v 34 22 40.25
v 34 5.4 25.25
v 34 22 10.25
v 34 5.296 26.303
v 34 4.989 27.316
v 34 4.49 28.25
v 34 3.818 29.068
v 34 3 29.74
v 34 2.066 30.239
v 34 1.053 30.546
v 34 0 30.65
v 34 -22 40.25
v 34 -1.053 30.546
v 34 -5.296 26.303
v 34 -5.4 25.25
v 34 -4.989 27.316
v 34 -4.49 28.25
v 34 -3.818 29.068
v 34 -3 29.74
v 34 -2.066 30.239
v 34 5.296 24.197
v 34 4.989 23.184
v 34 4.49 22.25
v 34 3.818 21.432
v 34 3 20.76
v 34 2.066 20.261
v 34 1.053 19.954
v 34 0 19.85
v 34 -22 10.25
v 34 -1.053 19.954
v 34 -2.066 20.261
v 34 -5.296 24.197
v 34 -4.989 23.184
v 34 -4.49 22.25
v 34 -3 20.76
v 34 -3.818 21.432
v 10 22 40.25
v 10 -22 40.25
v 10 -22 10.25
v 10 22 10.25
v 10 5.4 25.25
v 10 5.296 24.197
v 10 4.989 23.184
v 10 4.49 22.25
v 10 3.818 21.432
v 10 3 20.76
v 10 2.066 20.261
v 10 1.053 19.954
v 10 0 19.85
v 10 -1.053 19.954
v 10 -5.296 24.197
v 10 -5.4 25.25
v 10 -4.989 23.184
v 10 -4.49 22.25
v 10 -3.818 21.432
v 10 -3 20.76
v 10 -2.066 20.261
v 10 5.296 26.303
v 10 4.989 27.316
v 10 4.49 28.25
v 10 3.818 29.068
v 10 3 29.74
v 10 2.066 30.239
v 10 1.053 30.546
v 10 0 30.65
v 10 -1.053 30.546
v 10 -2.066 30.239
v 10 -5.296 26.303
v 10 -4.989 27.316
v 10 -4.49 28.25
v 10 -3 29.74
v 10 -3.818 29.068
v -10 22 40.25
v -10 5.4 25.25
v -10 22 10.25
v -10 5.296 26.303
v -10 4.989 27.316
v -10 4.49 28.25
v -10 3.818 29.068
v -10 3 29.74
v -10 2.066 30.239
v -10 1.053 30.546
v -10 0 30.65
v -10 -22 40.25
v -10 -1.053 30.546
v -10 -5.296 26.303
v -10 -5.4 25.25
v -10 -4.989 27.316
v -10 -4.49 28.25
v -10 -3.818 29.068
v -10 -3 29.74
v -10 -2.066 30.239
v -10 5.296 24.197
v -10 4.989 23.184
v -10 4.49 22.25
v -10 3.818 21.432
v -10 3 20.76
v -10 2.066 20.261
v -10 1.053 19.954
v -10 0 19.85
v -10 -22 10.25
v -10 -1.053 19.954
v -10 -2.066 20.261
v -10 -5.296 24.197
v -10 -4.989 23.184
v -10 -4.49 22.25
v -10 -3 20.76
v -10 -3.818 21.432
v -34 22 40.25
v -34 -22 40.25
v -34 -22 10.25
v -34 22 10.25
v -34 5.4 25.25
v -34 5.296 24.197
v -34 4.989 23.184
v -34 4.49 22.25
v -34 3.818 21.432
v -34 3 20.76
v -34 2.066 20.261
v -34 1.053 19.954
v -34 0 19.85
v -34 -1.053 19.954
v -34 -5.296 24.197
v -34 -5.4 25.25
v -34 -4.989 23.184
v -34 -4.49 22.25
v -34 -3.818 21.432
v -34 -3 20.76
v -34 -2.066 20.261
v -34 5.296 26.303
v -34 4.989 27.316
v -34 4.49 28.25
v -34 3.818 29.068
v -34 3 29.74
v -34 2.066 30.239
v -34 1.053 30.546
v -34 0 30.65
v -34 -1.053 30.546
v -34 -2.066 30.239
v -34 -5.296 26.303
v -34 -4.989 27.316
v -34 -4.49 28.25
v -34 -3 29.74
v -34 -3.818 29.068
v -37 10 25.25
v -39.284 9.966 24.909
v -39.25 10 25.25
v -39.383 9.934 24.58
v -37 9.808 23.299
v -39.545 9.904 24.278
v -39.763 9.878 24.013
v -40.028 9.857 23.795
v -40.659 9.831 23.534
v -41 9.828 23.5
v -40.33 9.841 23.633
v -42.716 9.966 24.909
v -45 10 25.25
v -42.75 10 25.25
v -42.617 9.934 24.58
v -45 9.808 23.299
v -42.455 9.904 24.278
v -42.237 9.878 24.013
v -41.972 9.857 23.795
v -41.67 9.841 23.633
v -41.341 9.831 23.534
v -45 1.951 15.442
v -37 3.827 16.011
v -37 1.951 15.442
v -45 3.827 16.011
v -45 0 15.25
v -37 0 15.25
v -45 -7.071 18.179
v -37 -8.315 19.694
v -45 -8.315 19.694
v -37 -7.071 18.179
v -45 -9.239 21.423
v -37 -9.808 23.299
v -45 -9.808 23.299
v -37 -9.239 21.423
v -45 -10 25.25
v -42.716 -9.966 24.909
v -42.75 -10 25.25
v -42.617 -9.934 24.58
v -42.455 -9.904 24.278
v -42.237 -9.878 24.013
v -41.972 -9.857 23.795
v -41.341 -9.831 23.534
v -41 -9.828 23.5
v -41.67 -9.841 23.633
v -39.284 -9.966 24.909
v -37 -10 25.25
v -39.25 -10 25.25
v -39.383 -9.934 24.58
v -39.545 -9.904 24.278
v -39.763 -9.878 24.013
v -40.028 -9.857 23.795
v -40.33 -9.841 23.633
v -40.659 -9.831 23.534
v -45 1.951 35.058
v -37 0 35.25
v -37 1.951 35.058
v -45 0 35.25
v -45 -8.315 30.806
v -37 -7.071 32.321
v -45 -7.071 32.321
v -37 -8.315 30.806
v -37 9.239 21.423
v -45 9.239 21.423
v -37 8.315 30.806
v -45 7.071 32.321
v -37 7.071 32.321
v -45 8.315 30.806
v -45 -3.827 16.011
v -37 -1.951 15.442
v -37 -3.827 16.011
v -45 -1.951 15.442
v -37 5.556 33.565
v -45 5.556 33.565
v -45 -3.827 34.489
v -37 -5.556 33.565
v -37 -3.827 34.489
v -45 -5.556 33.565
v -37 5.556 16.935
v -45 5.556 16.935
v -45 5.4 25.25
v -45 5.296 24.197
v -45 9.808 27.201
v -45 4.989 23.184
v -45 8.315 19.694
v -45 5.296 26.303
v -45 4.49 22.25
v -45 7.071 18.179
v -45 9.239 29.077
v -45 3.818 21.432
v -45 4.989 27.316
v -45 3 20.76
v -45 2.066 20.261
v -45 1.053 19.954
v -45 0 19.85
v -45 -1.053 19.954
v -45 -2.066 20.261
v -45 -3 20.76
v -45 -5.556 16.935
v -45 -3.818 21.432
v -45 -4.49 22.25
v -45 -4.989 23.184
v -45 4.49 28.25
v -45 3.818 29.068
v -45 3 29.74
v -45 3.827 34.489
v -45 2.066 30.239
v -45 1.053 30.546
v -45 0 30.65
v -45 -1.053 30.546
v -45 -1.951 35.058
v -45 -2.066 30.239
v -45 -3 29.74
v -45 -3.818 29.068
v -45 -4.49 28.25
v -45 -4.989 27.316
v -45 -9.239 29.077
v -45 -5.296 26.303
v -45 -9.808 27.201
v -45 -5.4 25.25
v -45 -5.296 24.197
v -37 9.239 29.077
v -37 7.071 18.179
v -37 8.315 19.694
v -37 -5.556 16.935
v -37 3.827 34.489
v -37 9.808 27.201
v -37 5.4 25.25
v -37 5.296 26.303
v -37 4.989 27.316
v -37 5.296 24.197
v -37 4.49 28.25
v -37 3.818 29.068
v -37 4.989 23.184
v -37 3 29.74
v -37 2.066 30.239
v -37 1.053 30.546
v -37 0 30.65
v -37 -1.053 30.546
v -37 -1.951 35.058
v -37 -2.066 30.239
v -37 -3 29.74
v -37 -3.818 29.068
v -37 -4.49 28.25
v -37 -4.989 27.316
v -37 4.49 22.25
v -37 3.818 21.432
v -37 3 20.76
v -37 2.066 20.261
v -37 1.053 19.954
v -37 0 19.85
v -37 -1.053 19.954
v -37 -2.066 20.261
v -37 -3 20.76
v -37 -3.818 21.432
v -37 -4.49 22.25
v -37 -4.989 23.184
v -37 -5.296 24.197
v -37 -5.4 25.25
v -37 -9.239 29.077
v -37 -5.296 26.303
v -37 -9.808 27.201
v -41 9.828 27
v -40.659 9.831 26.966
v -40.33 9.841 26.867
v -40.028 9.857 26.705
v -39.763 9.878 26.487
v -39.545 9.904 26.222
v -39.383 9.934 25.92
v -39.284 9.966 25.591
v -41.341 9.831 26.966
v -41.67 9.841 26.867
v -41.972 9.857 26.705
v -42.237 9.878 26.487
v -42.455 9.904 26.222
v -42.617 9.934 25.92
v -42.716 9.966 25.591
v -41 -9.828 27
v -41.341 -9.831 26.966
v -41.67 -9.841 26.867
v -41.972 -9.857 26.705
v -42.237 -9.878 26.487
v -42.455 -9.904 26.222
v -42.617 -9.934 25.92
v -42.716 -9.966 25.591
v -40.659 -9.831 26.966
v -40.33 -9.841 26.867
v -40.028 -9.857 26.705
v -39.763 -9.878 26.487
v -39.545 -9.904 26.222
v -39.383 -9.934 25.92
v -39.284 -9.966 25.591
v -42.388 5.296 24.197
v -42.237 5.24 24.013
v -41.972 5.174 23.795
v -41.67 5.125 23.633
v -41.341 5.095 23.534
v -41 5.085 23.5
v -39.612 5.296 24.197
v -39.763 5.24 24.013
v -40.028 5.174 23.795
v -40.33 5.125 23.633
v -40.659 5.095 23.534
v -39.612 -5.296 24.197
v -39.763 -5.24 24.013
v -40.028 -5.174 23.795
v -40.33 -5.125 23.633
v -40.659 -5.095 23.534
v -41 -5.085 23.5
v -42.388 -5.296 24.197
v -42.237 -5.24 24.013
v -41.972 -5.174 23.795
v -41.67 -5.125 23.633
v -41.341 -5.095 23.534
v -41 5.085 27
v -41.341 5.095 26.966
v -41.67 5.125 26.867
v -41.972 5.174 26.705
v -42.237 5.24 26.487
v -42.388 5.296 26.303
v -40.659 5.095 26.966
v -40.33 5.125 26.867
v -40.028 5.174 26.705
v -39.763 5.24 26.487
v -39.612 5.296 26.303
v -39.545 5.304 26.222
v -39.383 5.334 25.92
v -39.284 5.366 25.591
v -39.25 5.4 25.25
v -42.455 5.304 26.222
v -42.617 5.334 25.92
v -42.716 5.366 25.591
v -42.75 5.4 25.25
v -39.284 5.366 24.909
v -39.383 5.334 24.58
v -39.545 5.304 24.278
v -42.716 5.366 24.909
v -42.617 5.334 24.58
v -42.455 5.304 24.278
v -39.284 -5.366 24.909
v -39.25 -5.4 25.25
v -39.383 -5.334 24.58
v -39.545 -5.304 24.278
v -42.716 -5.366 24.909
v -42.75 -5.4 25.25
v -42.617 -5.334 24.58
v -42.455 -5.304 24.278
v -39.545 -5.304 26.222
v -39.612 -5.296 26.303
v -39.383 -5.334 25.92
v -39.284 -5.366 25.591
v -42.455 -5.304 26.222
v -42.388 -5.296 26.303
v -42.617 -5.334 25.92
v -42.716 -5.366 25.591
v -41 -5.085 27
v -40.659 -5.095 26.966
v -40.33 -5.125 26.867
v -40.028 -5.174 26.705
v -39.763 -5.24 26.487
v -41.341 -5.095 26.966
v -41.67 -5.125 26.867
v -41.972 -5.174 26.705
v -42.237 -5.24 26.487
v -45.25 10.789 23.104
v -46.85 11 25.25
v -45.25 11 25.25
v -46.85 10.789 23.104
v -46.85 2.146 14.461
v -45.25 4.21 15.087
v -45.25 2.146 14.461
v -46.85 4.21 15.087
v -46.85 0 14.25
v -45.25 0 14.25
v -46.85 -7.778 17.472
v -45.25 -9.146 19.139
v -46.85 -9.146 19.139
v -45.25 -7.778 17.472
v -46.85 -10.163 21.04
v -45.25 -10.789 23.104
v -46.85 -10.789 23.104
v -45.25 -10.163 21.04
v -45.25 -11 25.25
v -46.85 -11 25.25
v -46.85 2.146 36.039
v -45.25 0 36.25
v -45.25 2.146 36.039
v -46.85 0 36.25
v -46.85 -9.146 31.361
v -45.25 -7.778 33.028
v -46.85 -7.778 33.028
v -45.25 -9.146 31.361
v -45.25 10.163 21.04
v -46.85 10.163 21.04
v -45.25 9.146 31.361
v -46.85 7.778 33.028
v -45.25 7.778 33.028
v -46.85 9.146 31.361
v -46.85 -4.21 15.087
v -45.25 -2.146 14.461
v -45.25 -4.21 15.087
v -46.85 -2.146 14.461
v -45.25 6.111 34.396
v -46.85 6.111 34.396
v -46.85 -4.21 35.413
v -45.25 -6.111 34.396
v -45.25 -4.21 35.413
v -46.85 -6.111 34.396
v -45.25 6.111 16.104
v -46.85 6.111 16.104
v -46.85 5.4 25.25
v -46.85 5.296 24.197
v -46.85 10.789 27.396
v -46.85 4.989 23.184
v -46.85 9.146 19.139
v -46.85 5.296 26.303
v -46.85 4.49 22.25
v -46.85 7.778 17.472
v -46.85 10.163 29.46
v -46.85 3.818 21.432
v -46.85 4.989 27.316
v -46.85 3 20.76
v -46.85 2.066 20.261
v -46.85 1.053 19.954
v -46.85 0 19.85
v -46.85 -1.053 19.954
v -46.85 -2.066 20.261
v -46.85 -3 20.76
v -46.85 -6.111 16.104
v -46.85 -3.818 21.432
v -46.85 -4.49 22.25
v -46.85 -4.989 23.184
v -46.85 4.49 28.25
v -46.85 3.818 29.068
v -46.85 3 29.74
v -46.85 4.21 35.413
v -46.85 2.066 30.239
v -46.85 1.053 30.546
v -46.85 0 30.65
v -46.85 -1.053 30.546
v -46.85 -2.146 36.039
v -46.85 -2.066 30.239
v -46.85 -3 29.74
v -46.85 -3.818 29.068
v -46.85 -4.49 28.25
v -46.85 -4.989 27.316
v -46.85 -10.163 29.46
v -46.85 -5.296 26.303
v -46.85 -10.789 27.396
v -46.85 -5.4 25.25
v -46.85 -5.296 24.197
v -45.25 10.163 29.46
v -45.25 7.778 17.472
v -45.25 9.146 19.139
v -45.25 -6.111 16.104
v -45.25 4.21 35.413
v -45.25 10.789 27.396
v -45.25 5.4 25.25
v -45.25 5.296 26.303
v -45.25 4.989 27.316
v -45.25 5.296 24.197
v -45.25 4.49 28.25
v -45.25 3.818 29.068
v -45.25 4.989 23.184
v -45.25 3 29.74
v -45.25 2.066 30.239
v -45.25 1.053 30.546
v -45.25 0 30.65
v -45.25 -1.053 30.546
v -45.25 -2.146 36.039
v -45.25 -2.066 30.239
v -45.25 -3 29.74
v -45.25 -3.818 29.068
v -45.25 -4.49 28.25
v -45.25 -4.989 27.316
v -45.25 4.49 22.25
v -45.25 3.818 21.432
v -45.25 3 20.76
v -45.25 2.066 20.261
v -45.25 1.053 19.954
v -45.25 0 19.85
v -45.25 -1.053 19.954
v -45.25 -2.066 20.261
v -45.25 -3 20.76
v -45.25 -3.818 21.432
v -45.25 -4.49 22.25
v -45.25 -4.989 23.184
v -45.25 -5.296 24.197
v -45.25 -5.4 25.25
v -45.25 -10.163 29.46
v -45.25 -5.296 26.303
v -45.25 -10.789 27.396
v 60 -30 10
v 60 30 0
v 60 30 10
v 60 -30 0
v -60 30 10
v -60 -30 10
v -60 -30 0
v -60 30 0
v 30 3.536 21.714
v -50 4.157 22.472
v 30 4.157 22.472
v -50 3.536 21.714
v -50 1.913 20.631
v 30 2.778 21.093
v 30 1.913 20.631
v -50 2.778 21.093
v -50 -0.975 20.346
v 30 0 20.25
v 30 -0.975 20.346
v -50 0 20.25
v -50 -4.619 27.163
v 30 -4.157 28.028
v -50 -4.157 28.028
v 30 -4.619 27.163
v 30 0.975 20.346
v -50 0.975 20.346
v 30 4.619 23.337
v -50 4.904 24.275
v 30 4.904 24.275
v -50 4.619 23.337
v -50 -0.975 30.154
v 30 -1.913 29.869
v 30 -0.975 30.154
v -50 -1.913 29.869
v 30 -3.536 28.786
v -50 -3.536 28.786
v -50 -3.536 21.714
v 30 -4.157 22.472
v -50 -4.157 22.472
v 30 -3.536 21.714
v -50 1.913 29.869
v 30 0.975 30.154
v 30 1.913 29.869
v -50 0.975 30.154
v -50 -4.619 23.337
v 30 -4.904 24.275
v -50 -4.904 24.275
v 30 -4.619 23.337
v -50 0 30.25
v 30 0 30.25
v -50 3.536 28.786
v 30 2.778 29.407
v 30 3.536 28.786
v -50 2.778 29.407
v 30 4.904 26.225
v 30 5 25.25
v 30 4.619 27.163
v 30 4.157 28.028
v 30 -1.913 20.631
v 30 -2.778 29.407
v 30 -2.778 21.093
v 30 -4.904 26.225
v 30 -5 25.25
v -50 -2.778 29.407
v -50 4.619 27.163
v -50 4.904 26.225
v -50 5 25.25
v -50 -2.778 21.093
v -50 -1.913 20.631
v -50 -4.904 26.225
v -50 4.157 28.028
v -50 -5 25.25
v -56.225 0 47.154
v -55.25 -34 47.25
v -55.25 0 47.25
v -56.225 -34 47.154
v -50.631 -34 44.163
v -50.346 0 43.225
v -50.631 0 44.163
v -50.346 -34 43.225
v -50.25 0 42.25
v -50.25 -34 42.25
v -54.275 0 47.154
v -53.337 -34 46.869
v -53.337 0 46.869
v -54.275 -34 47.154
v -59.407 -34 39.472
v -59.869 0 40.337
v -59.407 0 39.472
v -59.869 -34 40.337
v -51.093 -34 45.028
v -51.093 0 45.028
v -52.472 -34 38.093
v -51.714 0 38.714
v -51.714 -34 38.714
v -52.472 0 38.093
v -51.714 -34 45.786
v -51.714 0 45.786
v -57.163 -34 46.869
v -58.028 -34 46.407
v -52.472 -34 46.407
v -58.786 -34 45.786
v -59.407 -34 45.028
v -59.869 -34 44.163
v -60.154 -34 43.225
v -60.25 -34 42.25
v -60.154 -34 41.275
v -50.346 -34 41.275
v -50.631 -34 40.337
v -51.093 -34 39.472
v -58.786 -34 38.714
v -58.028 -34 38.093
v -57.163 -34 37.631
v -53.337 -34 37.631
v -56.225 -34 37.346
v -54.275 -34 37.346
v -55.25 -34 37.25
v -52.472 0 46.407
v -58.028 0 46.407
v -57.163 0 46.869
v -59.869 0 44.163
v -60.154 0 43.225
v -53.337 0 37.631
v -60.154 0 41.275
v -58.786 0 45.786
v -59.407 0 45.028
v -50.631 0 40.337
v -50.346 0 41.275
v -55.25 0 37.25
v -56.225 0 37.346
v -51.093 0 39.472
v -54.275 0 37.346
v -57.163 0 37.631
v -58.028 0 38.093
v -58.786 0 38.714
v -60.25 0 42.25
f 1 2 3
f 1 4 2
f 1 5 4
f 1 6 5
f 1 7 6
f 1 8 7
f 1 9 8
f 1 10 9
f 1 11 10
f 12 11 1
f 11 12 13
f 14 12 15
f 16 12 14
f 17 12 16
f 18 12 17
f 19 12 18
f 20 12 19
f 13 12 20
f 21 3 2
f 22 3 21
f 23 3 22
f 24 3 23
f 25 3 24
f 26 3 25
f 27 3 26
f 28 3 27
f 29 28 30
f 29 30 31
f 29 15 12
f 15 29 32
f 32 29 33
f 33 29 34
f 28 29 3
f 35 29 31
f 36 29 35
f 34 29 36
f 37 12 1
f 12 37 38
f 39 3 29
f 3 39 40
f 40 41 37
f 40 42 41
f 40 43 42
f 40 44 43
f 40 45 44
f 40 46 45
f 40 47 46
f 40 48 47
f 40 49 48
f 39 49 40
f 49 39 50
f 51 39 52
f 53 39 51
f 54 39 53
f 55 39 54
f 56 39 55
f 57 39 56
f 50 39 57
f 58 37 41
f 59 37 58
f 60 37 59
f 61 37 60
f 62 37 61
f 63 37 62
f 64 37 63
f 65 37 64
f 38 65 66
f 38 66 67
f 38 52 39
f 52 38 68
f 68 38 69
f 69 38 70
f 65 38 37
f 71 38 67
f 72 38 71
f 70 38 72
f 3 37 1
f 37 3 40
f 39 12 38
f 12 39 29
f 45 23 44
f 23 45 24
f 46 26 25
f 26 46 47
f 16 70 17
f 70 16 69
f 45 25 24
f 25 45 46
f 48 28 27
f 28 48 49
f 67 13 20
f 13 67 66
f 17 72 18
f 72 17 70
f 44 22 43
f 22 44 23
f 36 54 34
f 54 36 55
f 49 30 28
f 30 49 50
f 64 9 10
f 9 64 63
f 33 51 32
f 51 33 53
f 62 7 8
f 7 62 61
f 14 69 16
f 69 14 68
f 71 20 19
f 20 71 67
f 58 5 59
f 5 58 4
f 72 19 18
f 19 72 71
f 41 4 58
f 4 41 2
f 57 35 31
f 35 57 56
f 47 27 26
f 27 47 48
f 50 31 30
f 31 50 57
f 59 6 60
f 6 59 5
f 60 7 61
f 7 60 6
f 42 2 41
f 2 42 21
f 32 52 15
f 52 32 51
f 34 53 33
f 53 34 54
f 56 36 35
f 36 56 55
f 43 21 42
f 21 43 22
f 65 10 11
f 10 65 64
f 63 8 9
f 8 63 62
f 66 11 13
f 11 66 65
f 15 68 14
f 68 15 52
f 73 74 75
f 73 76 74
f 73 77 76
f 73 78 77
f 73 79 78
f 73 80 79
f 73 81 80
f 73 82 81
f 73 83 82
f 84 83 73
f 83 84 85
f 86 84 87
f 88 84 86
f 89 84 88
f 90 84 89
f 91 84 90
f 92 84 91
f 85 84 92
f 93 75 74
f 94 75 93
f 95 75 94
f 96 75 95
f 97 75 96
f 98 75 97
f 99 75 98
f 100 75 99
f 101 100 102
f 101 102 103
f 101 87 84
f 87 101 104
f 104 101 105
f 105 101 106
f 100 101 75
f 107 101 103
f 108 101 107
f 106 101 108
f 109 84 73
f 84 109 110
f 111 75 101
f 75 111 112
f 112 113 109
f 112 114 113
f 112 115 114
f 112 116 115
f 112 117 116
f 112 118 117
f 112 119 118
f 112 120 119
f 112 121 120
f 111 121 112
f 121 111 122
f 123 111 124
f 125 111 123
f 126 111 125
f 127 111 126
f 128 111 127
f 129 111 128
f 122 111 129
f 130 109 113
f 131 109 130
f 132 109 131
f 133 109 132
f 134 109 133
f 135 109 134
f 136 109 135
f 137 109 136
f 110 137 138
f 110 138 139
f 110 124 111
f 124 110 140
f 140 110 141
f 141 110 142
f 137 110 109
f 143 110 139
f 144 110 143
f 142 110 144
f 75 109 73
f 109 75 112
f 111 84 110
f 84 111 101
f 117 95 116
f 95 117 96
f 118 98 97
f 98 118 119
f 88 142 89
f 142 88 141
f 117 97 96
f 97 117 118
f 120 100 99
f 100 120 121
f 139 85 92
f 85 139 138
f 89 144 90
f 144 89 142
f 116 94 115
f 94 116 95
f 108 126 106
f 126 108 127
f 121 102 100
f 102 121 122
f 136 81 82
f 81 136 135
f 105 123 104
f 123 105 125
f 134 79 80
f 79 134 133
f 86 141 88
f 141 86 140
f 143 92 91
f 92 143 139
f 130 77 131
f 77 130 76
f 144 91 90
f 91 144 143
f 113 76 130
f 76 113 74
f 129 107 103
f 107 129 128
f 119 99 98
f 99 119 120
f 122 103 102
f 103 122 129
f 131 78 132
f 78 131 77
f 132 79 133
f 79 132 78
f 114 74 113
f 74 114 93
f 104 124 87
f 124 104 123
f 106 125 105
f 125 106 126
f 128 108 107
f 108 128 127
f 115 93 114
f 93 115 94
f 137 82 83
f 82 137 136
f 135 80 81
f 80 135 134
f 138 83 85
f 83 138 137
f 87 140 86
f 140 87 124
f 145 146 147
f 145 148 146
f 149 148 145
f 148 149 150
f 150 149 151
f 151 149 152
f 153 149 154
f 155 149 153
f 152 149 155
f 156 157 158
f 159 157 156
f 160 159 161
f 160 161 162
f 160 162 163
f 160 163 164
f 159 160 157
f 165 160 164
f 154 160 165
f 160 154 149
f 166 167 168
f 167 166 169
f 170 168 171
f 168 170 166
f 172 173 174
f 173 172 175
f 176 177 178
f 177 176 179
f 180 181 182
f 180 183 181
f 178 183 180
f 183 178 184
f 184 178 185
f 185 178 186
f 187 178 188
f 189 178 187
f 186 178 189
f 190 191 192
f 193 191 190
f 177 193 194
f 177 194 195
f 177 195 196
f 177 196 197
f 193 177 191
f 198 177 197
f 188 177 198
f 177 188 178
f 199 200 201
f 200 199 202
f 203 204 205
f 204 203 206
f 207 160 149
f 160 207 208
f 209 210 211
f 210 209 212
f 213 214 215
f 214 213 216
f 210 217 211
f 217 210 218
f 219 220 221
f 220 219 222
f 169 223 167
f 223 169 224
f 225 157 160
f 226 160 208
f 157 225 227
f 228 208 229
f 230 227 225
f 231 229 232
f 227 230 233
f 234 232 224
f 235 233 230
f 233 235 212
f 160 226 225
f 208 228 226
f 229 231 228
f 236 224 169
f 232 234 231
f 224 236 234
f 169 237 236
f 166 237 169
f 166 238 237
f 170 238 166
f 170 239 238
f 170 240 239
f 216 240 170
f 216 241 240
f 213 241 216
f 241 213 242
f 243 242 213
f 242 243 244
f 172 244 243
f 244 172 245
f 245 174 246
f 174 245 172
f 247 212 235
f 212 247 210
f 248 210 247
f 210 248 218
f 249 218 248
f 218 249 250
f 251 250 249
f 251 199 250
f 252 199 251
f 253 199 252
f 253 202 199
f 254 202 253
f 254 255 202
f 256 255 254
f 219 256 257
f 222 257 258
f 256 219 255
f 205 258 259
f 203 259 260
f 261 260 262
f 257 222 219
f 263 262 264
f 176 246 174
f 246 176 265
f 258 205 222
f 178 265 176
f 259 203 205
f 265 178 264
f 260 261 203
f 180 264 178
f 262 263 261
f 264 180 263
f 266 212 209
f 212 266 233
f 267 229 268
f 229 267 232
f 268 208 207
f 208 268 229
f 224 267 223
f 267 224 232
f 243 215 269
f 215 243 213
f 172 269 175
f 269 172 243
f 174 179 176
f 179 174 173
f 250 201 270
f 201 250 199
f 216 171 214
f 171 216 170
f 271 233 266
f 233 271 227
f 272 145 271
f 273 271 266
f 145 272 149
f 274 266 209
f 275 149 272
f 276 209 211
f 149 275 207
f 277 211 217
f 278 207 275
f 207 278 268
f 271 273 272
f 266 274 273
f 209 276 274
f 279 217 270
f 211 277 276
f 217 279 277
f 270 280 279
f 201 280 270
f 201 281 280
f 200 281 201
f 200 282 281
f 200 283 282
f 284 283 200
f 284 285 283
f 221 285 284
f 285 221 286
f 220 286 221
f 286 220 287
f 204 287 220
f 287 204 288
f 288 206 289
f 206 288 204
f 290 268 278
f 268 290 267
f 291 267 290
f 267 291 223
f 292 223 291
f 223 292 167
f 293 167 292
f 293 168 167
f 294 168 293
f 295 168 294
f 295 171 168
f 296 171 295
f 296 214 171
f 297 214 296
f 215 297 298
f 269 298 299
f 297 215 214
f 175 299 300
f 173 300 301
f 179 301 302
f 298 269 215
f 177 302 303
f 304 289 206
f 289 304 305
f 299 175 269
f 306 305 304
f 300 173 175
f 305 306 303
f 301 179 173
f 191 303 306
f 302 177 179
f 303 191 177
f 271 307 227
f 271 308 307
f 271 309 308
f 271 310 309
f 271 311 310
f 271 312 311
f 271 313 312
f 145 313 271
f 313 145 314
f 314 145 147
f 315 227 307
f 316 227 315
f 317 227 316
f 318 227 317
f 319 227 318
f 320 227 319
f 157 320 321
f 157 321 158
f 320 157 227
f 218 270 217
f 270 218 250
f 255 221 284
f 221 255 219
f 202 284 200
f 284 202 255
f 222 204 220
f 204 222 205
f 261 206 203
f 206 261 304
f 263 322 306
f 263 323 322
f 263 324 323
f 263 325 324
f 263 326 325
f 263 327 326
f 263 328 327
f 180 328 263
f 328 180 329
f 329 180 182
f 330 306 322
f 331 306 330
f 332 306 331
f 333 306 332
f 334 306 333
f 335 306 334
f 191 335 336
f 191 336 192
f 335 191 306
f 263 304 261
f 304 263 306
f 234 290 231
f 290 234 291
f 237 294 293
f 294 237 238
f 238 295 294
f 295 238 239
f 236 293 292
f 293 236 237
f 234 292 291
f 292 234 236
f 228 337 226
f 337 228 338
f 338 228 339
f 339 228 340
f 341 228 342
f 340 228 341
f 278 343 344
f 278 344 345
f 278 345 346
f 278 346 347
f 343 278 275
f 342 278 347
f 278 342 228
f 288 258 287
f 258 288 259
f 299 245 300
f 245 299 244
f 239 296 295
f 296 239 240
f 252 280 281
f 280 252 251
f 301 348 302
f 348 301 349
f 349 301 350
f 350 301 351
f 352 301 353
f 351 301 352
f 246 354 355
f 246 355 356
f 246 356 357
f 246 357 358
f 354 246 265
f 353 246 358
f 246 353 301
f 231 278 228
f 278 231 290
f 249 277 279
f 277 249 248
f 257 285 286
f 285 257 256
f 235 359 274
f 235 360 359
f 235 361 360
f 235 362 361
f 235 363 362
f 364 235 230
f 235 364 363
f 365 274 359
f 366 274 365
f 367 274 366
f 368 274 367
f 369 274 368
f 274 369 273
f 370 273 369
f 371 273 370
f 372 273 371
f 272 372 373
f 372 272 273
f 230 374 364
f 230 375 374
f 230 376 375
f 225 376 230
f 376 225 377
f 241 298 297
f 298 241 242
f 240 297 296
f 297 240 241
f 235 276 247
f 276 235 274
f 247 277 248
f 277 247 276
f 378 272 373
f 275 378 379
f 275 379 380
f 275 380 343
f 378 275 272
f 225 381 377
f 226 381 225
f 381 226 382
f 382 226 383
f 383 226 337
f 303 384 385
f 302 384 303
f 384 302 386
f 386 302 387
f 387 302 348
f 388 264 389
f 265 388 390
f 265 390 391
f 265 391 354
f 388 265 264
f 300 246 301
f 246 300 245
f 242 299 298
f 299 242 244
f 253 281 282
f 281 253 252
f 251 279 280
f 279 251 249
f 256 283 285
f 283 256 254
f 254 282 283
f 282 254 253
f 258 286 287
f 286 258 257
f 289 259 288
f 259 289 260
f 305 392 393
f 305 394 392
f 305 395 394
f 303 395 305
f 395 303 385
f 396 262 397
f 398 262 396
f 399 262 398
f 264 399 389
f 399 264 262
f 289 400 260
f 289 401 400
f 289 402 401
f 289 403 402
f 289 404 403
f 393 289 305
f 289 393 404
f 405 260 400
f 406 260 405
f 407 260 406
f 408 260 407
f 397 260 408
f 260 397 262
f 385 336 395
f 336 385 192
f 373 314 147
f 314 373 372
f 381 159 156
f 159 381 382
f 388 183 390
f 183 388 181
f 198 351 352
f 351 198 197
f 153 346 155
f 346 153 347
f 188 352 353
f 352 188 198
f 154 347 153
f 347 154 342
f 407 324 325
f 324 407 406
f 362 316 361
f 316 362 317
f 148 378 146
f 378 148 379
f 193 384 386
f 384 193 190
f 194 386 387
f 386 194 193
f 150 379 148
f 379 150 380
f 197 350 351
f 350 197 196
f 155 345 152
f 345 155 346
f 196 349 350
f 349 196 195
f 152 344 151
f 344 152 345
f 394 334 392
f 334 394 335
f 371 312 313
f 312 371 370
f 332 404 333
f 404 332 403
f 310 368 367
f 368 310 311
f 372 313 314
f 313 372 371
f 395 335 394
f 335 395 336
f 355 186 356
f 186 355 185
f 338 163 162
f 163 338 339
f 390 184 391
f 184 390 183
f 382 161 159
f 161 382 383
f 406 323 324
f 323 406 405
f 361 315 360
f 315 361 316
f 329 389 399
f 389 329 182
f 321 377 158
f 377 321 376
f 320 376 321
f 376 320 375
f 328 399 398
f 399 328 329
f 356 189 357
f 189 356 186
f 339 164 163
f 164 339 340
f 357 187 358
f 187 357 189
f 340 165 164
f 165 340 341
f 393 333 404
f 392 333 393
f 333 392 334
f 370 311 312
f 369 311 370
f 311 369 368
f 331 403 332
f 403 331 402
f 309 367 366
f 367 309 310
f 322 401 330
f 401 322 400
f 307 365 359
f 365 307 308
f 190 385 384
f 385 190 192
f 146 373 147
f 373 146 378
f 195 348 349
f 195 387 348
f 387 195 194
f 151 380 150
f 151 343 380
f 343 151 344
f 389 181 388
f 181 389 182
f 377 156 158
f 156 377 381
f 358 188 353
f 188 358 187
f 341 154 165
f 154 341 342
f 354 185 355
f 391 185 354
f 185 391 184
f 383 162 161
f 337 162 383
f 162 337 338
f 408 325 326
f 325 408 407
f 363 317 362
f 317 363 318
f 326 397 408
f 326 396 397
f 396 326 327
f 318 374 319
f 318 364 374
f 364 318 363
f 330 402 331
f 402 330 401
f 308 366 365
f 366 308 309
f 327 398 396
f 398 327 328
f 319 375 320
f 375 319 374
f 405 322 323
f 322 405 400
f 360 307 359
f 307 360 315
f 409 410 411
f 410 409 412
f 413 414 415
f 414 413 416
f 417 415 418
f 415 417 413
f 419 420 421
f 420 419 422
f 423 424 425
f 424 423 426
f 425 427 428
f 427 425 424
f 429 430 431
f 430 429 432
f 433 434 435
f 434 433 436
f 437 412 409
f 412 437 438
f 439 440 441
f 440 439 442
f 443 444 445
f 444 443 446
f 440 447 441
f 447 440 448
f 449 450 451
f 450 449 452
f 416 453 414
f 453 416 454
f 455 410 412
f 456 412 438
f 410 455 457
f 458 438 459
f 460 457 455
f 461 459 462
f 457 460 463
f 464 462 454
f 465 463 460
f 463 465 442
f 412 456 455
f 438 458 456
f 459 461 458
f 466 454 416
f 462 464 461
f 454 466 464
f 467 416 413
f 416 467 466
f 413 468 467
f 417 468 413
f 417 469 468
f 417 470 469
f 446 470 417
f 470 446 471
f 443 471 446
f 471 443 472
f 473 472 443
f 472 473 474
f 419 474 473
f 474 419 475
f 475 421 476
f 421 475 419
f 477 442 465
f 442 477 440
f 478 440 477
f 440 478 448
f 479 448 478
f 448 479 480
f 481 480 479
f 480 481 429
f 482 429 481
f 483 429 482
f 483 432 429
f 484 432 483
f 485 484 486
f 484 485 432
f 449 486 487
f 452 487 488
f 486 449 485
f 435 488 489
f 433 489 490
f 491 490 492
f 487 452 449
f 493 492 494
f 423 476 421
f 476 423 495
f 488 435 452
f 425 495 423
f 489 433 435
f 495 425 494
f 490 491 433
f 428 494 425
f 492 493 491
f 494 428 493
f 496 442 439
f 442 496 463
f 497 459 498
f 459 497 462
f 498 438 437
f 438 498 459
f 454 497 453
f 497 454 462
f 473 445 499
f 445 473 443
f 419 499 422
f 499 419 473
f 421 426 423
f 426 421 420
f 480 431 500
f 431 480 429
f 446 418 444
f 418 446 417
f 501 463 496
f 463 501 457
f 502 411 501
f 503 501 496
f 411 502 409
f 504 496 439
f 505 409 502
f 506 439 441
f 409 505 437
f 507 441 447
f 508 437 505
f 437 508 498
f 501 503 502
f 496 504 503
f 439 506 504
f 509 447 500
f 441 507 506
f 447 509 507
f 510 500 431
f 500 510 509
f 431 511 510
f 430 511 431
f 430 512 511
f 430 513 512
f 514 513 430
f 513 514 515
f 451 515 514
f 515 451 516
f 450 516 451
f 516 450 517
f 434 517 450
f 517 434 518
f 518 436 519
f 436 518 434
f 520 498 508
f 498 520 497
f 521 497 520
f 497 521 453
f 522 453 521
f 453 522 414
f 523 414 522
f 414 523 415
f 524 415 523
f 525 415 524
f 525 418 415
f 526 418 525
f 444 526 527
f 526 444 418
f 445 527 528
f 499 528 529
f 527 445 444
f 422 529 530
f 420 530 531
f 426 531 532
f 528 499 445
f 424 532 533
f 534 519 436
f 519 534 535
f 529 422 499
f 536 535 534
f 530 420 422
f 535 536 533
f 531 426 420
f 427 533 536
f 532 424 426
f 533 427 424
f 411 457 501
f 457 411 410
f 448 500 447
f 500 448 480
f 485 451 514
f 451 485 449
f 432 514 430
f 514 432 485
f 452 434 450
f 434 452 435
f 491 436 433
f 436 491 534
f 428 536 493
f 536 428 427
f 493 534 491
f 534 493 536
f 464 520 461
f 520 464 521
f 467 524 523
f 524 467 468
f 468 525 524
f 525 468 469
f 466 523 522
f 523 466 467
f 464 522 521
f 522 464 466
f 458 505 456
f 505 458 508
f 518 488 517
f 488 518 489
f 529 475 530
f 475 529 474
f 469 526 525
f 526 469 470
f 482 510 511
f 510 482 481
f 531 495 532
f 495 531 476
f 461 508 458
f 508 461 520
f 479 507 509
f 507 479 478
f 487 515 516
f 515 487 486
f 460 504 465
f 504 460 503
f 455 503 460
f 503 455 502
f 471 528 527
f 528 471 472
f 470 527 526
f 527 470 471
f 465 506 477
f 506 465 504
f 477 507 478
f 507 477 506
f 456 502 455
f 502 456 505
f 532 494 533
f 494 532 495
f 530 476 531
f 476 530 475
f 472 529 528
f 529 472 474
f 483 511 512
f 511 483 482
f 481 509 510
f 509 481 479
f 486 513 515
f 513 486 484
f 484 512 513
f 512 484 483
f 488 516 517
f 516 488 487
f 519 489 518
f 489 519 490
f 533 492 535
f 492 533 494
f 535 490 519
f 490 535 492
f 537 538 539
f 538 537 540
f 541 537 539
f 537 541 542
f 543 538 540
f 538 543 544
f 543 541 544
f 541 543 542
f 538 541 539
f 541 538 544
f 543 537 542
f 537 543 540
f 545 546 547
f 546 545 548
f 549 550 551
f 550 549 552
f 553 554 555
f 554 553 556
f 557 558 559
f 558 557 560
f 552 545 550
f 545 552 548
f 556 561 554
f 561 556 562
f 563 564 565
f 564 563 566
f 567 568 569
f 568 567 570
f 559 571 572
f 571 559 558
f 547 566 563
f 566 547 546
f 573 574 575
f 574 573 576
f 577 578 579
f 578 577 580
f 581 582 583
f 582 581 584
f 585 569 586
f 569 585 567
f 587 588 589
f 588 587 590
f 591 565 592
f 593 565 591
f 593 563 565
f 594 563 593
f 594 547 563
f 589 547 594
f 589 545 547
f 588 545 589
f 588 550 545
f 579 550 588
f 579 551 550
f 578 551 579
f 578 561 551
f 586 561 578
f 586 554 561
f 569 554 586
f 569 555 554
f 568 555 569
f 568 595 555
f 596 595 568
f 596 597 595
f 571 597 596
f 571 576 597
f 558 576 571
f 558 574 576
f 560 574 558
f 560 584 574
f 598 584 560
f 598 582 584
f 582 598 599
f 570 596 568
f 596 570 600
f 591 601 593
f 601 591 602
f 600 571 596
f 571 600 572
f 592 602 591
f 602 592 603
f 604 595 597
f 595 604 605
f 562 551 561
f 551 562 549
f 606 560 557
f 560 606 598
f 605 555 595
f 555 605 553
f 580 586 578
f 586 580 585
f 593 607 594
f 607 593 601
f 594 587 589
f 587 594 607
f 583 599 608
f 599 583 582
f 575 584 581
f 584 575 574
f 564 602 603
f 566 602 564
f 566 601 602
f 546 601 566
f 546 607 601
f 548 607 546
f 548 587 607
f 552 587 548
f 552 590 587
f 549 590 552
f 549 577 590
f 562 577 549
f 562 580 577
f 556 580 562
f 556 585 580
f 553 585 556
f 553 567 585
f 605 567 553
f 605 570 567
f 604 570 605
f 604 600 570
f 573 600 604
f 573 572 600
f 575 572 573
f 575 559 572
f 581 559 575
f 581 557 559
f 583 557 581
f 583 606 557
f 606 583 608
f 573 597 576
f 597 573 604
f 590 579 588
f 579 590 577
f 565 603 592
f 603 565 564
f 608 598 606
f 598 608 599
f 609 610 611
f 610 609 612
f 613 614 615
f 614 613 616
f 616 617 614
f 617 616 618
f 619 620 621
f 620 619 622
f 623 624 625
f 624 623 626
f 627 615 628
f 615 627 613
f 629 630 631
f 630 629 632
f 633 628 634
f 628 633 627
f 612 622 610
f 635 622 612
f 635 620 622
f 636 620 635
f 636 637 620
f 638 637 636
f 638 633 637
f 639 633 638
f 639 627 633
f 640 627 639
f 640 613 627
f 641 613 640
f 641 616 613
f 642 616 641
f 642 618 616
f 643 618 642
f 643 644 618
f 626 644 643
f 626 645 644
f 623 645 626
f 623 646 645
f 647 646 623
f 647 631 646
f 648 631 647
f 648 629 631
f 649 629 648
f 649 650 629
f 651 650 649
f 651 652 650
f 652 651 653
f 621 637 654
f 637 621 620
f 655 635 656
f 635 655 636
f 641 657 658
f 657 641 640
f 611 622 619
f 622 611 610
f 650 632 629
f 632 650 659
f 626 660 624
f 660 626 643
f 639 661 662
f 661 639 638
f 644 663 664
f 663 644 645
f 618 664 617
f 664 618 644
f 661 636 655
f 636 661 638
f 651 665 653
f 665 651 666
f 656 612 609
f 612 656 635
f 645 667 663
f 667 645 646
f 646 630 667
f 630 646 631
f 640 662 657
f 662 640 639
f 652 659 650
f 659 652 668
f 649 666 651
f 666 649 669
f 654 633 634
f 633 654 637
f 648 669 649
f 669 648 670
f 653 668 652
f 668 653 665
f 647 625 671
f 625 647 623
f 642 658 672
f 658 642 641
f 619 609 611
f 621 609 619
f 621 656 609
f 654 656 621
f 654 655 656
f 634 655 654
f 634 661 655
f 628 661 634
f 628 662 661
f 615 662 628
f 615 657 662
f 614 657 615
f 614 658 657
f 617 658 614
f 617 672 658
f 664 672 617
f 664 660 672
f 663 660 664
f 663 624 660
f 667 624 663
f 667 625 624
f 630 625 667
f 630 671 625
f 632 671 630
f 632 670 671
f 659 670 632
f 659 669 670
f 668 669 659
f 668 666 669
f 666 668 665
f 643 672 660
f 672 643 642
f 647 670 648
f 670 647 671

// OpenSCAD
$fn = 32;

// ------------------------------------------------------------------------
// Machine vise: screw d10, jaws 24 x 30 mm
// Every part is its own module, assembly() places every instance.
// ------------------------------------------------------------------------

// --- part 1 ---
module vise_bed() {
  difference() {
    translate([-60, -30, 0]) cube([120, 60, 10]);
  }
}

// --- part 2 ---
module vise_jaw() {
  difference() {
    translate([-12, -22, 0]) cube([24, 44, 30]);
    translate([0, 0, 15]) rotate([0, 90, 0]) cylinder(h = 26, d = 10.8, center = true);
  }
}

// --- part 3 ---
module vise_screw() {
  translate([0, 0, -40]) cylinder(h = 80, d = 10);
}

// --- part 4 ---
module screw_collar() {
  difference() {
    cylinder(h = 8, d = 20);
    translate([0, 0, -1]) cylinder(h = 10, d = 10.8);
    translate([0, 0, 4]) rotate([90, 0, 0]) cylinder(h = 22, d = 3.5, center = true);
  }
}

// --- part 5 ---
module screw_washer() {
  difference() {
      translate([0, 0, 0]) cylinder(h = 1.6, d = 22);
      translate([0, 0, -1]) cylinder(h = 3.6, d = 10.8);
    }
}

// --- part 6 ---
module vise_handle() {
  cylinder(h = 34, d = 10);
}

// --- assembly ---
module assembly() {
  color([0.80, 0.24, 0.20]) translate([0, 0, 0]) rotate([0, 0, 0]) vise_bed();
  color([0.20, 0.45, 0.75]) translate([22, 0, 10.25]) rotate([0, 0, 0]) vise_jaw();
  color([0.25, 0.62, 0.32]) translate([-22, 0, 10.25]) rotate([0, 0, 0]) vise_jaw();
  color([0.92, 0.70, 0.18]) translate([-10, 0, 25.25]) rotate([0, 90, 0]) vise_screw();
  color([0.58, 0.35, 0.70]) translate([-45, 0, 25.25]) rotate([0, 90, 0]) screw_collar();
  color([0.16, 0.66, 0.66]) translate([-46.85, 0, 25.25]) rotate([0, 90, 0]) screw_washer();
  color([0.85, 0.48, 0.18]) translate([-55.25, 0, 42.25]) rotate([90, 0, 0]) vise_handle();
}

assembly();
